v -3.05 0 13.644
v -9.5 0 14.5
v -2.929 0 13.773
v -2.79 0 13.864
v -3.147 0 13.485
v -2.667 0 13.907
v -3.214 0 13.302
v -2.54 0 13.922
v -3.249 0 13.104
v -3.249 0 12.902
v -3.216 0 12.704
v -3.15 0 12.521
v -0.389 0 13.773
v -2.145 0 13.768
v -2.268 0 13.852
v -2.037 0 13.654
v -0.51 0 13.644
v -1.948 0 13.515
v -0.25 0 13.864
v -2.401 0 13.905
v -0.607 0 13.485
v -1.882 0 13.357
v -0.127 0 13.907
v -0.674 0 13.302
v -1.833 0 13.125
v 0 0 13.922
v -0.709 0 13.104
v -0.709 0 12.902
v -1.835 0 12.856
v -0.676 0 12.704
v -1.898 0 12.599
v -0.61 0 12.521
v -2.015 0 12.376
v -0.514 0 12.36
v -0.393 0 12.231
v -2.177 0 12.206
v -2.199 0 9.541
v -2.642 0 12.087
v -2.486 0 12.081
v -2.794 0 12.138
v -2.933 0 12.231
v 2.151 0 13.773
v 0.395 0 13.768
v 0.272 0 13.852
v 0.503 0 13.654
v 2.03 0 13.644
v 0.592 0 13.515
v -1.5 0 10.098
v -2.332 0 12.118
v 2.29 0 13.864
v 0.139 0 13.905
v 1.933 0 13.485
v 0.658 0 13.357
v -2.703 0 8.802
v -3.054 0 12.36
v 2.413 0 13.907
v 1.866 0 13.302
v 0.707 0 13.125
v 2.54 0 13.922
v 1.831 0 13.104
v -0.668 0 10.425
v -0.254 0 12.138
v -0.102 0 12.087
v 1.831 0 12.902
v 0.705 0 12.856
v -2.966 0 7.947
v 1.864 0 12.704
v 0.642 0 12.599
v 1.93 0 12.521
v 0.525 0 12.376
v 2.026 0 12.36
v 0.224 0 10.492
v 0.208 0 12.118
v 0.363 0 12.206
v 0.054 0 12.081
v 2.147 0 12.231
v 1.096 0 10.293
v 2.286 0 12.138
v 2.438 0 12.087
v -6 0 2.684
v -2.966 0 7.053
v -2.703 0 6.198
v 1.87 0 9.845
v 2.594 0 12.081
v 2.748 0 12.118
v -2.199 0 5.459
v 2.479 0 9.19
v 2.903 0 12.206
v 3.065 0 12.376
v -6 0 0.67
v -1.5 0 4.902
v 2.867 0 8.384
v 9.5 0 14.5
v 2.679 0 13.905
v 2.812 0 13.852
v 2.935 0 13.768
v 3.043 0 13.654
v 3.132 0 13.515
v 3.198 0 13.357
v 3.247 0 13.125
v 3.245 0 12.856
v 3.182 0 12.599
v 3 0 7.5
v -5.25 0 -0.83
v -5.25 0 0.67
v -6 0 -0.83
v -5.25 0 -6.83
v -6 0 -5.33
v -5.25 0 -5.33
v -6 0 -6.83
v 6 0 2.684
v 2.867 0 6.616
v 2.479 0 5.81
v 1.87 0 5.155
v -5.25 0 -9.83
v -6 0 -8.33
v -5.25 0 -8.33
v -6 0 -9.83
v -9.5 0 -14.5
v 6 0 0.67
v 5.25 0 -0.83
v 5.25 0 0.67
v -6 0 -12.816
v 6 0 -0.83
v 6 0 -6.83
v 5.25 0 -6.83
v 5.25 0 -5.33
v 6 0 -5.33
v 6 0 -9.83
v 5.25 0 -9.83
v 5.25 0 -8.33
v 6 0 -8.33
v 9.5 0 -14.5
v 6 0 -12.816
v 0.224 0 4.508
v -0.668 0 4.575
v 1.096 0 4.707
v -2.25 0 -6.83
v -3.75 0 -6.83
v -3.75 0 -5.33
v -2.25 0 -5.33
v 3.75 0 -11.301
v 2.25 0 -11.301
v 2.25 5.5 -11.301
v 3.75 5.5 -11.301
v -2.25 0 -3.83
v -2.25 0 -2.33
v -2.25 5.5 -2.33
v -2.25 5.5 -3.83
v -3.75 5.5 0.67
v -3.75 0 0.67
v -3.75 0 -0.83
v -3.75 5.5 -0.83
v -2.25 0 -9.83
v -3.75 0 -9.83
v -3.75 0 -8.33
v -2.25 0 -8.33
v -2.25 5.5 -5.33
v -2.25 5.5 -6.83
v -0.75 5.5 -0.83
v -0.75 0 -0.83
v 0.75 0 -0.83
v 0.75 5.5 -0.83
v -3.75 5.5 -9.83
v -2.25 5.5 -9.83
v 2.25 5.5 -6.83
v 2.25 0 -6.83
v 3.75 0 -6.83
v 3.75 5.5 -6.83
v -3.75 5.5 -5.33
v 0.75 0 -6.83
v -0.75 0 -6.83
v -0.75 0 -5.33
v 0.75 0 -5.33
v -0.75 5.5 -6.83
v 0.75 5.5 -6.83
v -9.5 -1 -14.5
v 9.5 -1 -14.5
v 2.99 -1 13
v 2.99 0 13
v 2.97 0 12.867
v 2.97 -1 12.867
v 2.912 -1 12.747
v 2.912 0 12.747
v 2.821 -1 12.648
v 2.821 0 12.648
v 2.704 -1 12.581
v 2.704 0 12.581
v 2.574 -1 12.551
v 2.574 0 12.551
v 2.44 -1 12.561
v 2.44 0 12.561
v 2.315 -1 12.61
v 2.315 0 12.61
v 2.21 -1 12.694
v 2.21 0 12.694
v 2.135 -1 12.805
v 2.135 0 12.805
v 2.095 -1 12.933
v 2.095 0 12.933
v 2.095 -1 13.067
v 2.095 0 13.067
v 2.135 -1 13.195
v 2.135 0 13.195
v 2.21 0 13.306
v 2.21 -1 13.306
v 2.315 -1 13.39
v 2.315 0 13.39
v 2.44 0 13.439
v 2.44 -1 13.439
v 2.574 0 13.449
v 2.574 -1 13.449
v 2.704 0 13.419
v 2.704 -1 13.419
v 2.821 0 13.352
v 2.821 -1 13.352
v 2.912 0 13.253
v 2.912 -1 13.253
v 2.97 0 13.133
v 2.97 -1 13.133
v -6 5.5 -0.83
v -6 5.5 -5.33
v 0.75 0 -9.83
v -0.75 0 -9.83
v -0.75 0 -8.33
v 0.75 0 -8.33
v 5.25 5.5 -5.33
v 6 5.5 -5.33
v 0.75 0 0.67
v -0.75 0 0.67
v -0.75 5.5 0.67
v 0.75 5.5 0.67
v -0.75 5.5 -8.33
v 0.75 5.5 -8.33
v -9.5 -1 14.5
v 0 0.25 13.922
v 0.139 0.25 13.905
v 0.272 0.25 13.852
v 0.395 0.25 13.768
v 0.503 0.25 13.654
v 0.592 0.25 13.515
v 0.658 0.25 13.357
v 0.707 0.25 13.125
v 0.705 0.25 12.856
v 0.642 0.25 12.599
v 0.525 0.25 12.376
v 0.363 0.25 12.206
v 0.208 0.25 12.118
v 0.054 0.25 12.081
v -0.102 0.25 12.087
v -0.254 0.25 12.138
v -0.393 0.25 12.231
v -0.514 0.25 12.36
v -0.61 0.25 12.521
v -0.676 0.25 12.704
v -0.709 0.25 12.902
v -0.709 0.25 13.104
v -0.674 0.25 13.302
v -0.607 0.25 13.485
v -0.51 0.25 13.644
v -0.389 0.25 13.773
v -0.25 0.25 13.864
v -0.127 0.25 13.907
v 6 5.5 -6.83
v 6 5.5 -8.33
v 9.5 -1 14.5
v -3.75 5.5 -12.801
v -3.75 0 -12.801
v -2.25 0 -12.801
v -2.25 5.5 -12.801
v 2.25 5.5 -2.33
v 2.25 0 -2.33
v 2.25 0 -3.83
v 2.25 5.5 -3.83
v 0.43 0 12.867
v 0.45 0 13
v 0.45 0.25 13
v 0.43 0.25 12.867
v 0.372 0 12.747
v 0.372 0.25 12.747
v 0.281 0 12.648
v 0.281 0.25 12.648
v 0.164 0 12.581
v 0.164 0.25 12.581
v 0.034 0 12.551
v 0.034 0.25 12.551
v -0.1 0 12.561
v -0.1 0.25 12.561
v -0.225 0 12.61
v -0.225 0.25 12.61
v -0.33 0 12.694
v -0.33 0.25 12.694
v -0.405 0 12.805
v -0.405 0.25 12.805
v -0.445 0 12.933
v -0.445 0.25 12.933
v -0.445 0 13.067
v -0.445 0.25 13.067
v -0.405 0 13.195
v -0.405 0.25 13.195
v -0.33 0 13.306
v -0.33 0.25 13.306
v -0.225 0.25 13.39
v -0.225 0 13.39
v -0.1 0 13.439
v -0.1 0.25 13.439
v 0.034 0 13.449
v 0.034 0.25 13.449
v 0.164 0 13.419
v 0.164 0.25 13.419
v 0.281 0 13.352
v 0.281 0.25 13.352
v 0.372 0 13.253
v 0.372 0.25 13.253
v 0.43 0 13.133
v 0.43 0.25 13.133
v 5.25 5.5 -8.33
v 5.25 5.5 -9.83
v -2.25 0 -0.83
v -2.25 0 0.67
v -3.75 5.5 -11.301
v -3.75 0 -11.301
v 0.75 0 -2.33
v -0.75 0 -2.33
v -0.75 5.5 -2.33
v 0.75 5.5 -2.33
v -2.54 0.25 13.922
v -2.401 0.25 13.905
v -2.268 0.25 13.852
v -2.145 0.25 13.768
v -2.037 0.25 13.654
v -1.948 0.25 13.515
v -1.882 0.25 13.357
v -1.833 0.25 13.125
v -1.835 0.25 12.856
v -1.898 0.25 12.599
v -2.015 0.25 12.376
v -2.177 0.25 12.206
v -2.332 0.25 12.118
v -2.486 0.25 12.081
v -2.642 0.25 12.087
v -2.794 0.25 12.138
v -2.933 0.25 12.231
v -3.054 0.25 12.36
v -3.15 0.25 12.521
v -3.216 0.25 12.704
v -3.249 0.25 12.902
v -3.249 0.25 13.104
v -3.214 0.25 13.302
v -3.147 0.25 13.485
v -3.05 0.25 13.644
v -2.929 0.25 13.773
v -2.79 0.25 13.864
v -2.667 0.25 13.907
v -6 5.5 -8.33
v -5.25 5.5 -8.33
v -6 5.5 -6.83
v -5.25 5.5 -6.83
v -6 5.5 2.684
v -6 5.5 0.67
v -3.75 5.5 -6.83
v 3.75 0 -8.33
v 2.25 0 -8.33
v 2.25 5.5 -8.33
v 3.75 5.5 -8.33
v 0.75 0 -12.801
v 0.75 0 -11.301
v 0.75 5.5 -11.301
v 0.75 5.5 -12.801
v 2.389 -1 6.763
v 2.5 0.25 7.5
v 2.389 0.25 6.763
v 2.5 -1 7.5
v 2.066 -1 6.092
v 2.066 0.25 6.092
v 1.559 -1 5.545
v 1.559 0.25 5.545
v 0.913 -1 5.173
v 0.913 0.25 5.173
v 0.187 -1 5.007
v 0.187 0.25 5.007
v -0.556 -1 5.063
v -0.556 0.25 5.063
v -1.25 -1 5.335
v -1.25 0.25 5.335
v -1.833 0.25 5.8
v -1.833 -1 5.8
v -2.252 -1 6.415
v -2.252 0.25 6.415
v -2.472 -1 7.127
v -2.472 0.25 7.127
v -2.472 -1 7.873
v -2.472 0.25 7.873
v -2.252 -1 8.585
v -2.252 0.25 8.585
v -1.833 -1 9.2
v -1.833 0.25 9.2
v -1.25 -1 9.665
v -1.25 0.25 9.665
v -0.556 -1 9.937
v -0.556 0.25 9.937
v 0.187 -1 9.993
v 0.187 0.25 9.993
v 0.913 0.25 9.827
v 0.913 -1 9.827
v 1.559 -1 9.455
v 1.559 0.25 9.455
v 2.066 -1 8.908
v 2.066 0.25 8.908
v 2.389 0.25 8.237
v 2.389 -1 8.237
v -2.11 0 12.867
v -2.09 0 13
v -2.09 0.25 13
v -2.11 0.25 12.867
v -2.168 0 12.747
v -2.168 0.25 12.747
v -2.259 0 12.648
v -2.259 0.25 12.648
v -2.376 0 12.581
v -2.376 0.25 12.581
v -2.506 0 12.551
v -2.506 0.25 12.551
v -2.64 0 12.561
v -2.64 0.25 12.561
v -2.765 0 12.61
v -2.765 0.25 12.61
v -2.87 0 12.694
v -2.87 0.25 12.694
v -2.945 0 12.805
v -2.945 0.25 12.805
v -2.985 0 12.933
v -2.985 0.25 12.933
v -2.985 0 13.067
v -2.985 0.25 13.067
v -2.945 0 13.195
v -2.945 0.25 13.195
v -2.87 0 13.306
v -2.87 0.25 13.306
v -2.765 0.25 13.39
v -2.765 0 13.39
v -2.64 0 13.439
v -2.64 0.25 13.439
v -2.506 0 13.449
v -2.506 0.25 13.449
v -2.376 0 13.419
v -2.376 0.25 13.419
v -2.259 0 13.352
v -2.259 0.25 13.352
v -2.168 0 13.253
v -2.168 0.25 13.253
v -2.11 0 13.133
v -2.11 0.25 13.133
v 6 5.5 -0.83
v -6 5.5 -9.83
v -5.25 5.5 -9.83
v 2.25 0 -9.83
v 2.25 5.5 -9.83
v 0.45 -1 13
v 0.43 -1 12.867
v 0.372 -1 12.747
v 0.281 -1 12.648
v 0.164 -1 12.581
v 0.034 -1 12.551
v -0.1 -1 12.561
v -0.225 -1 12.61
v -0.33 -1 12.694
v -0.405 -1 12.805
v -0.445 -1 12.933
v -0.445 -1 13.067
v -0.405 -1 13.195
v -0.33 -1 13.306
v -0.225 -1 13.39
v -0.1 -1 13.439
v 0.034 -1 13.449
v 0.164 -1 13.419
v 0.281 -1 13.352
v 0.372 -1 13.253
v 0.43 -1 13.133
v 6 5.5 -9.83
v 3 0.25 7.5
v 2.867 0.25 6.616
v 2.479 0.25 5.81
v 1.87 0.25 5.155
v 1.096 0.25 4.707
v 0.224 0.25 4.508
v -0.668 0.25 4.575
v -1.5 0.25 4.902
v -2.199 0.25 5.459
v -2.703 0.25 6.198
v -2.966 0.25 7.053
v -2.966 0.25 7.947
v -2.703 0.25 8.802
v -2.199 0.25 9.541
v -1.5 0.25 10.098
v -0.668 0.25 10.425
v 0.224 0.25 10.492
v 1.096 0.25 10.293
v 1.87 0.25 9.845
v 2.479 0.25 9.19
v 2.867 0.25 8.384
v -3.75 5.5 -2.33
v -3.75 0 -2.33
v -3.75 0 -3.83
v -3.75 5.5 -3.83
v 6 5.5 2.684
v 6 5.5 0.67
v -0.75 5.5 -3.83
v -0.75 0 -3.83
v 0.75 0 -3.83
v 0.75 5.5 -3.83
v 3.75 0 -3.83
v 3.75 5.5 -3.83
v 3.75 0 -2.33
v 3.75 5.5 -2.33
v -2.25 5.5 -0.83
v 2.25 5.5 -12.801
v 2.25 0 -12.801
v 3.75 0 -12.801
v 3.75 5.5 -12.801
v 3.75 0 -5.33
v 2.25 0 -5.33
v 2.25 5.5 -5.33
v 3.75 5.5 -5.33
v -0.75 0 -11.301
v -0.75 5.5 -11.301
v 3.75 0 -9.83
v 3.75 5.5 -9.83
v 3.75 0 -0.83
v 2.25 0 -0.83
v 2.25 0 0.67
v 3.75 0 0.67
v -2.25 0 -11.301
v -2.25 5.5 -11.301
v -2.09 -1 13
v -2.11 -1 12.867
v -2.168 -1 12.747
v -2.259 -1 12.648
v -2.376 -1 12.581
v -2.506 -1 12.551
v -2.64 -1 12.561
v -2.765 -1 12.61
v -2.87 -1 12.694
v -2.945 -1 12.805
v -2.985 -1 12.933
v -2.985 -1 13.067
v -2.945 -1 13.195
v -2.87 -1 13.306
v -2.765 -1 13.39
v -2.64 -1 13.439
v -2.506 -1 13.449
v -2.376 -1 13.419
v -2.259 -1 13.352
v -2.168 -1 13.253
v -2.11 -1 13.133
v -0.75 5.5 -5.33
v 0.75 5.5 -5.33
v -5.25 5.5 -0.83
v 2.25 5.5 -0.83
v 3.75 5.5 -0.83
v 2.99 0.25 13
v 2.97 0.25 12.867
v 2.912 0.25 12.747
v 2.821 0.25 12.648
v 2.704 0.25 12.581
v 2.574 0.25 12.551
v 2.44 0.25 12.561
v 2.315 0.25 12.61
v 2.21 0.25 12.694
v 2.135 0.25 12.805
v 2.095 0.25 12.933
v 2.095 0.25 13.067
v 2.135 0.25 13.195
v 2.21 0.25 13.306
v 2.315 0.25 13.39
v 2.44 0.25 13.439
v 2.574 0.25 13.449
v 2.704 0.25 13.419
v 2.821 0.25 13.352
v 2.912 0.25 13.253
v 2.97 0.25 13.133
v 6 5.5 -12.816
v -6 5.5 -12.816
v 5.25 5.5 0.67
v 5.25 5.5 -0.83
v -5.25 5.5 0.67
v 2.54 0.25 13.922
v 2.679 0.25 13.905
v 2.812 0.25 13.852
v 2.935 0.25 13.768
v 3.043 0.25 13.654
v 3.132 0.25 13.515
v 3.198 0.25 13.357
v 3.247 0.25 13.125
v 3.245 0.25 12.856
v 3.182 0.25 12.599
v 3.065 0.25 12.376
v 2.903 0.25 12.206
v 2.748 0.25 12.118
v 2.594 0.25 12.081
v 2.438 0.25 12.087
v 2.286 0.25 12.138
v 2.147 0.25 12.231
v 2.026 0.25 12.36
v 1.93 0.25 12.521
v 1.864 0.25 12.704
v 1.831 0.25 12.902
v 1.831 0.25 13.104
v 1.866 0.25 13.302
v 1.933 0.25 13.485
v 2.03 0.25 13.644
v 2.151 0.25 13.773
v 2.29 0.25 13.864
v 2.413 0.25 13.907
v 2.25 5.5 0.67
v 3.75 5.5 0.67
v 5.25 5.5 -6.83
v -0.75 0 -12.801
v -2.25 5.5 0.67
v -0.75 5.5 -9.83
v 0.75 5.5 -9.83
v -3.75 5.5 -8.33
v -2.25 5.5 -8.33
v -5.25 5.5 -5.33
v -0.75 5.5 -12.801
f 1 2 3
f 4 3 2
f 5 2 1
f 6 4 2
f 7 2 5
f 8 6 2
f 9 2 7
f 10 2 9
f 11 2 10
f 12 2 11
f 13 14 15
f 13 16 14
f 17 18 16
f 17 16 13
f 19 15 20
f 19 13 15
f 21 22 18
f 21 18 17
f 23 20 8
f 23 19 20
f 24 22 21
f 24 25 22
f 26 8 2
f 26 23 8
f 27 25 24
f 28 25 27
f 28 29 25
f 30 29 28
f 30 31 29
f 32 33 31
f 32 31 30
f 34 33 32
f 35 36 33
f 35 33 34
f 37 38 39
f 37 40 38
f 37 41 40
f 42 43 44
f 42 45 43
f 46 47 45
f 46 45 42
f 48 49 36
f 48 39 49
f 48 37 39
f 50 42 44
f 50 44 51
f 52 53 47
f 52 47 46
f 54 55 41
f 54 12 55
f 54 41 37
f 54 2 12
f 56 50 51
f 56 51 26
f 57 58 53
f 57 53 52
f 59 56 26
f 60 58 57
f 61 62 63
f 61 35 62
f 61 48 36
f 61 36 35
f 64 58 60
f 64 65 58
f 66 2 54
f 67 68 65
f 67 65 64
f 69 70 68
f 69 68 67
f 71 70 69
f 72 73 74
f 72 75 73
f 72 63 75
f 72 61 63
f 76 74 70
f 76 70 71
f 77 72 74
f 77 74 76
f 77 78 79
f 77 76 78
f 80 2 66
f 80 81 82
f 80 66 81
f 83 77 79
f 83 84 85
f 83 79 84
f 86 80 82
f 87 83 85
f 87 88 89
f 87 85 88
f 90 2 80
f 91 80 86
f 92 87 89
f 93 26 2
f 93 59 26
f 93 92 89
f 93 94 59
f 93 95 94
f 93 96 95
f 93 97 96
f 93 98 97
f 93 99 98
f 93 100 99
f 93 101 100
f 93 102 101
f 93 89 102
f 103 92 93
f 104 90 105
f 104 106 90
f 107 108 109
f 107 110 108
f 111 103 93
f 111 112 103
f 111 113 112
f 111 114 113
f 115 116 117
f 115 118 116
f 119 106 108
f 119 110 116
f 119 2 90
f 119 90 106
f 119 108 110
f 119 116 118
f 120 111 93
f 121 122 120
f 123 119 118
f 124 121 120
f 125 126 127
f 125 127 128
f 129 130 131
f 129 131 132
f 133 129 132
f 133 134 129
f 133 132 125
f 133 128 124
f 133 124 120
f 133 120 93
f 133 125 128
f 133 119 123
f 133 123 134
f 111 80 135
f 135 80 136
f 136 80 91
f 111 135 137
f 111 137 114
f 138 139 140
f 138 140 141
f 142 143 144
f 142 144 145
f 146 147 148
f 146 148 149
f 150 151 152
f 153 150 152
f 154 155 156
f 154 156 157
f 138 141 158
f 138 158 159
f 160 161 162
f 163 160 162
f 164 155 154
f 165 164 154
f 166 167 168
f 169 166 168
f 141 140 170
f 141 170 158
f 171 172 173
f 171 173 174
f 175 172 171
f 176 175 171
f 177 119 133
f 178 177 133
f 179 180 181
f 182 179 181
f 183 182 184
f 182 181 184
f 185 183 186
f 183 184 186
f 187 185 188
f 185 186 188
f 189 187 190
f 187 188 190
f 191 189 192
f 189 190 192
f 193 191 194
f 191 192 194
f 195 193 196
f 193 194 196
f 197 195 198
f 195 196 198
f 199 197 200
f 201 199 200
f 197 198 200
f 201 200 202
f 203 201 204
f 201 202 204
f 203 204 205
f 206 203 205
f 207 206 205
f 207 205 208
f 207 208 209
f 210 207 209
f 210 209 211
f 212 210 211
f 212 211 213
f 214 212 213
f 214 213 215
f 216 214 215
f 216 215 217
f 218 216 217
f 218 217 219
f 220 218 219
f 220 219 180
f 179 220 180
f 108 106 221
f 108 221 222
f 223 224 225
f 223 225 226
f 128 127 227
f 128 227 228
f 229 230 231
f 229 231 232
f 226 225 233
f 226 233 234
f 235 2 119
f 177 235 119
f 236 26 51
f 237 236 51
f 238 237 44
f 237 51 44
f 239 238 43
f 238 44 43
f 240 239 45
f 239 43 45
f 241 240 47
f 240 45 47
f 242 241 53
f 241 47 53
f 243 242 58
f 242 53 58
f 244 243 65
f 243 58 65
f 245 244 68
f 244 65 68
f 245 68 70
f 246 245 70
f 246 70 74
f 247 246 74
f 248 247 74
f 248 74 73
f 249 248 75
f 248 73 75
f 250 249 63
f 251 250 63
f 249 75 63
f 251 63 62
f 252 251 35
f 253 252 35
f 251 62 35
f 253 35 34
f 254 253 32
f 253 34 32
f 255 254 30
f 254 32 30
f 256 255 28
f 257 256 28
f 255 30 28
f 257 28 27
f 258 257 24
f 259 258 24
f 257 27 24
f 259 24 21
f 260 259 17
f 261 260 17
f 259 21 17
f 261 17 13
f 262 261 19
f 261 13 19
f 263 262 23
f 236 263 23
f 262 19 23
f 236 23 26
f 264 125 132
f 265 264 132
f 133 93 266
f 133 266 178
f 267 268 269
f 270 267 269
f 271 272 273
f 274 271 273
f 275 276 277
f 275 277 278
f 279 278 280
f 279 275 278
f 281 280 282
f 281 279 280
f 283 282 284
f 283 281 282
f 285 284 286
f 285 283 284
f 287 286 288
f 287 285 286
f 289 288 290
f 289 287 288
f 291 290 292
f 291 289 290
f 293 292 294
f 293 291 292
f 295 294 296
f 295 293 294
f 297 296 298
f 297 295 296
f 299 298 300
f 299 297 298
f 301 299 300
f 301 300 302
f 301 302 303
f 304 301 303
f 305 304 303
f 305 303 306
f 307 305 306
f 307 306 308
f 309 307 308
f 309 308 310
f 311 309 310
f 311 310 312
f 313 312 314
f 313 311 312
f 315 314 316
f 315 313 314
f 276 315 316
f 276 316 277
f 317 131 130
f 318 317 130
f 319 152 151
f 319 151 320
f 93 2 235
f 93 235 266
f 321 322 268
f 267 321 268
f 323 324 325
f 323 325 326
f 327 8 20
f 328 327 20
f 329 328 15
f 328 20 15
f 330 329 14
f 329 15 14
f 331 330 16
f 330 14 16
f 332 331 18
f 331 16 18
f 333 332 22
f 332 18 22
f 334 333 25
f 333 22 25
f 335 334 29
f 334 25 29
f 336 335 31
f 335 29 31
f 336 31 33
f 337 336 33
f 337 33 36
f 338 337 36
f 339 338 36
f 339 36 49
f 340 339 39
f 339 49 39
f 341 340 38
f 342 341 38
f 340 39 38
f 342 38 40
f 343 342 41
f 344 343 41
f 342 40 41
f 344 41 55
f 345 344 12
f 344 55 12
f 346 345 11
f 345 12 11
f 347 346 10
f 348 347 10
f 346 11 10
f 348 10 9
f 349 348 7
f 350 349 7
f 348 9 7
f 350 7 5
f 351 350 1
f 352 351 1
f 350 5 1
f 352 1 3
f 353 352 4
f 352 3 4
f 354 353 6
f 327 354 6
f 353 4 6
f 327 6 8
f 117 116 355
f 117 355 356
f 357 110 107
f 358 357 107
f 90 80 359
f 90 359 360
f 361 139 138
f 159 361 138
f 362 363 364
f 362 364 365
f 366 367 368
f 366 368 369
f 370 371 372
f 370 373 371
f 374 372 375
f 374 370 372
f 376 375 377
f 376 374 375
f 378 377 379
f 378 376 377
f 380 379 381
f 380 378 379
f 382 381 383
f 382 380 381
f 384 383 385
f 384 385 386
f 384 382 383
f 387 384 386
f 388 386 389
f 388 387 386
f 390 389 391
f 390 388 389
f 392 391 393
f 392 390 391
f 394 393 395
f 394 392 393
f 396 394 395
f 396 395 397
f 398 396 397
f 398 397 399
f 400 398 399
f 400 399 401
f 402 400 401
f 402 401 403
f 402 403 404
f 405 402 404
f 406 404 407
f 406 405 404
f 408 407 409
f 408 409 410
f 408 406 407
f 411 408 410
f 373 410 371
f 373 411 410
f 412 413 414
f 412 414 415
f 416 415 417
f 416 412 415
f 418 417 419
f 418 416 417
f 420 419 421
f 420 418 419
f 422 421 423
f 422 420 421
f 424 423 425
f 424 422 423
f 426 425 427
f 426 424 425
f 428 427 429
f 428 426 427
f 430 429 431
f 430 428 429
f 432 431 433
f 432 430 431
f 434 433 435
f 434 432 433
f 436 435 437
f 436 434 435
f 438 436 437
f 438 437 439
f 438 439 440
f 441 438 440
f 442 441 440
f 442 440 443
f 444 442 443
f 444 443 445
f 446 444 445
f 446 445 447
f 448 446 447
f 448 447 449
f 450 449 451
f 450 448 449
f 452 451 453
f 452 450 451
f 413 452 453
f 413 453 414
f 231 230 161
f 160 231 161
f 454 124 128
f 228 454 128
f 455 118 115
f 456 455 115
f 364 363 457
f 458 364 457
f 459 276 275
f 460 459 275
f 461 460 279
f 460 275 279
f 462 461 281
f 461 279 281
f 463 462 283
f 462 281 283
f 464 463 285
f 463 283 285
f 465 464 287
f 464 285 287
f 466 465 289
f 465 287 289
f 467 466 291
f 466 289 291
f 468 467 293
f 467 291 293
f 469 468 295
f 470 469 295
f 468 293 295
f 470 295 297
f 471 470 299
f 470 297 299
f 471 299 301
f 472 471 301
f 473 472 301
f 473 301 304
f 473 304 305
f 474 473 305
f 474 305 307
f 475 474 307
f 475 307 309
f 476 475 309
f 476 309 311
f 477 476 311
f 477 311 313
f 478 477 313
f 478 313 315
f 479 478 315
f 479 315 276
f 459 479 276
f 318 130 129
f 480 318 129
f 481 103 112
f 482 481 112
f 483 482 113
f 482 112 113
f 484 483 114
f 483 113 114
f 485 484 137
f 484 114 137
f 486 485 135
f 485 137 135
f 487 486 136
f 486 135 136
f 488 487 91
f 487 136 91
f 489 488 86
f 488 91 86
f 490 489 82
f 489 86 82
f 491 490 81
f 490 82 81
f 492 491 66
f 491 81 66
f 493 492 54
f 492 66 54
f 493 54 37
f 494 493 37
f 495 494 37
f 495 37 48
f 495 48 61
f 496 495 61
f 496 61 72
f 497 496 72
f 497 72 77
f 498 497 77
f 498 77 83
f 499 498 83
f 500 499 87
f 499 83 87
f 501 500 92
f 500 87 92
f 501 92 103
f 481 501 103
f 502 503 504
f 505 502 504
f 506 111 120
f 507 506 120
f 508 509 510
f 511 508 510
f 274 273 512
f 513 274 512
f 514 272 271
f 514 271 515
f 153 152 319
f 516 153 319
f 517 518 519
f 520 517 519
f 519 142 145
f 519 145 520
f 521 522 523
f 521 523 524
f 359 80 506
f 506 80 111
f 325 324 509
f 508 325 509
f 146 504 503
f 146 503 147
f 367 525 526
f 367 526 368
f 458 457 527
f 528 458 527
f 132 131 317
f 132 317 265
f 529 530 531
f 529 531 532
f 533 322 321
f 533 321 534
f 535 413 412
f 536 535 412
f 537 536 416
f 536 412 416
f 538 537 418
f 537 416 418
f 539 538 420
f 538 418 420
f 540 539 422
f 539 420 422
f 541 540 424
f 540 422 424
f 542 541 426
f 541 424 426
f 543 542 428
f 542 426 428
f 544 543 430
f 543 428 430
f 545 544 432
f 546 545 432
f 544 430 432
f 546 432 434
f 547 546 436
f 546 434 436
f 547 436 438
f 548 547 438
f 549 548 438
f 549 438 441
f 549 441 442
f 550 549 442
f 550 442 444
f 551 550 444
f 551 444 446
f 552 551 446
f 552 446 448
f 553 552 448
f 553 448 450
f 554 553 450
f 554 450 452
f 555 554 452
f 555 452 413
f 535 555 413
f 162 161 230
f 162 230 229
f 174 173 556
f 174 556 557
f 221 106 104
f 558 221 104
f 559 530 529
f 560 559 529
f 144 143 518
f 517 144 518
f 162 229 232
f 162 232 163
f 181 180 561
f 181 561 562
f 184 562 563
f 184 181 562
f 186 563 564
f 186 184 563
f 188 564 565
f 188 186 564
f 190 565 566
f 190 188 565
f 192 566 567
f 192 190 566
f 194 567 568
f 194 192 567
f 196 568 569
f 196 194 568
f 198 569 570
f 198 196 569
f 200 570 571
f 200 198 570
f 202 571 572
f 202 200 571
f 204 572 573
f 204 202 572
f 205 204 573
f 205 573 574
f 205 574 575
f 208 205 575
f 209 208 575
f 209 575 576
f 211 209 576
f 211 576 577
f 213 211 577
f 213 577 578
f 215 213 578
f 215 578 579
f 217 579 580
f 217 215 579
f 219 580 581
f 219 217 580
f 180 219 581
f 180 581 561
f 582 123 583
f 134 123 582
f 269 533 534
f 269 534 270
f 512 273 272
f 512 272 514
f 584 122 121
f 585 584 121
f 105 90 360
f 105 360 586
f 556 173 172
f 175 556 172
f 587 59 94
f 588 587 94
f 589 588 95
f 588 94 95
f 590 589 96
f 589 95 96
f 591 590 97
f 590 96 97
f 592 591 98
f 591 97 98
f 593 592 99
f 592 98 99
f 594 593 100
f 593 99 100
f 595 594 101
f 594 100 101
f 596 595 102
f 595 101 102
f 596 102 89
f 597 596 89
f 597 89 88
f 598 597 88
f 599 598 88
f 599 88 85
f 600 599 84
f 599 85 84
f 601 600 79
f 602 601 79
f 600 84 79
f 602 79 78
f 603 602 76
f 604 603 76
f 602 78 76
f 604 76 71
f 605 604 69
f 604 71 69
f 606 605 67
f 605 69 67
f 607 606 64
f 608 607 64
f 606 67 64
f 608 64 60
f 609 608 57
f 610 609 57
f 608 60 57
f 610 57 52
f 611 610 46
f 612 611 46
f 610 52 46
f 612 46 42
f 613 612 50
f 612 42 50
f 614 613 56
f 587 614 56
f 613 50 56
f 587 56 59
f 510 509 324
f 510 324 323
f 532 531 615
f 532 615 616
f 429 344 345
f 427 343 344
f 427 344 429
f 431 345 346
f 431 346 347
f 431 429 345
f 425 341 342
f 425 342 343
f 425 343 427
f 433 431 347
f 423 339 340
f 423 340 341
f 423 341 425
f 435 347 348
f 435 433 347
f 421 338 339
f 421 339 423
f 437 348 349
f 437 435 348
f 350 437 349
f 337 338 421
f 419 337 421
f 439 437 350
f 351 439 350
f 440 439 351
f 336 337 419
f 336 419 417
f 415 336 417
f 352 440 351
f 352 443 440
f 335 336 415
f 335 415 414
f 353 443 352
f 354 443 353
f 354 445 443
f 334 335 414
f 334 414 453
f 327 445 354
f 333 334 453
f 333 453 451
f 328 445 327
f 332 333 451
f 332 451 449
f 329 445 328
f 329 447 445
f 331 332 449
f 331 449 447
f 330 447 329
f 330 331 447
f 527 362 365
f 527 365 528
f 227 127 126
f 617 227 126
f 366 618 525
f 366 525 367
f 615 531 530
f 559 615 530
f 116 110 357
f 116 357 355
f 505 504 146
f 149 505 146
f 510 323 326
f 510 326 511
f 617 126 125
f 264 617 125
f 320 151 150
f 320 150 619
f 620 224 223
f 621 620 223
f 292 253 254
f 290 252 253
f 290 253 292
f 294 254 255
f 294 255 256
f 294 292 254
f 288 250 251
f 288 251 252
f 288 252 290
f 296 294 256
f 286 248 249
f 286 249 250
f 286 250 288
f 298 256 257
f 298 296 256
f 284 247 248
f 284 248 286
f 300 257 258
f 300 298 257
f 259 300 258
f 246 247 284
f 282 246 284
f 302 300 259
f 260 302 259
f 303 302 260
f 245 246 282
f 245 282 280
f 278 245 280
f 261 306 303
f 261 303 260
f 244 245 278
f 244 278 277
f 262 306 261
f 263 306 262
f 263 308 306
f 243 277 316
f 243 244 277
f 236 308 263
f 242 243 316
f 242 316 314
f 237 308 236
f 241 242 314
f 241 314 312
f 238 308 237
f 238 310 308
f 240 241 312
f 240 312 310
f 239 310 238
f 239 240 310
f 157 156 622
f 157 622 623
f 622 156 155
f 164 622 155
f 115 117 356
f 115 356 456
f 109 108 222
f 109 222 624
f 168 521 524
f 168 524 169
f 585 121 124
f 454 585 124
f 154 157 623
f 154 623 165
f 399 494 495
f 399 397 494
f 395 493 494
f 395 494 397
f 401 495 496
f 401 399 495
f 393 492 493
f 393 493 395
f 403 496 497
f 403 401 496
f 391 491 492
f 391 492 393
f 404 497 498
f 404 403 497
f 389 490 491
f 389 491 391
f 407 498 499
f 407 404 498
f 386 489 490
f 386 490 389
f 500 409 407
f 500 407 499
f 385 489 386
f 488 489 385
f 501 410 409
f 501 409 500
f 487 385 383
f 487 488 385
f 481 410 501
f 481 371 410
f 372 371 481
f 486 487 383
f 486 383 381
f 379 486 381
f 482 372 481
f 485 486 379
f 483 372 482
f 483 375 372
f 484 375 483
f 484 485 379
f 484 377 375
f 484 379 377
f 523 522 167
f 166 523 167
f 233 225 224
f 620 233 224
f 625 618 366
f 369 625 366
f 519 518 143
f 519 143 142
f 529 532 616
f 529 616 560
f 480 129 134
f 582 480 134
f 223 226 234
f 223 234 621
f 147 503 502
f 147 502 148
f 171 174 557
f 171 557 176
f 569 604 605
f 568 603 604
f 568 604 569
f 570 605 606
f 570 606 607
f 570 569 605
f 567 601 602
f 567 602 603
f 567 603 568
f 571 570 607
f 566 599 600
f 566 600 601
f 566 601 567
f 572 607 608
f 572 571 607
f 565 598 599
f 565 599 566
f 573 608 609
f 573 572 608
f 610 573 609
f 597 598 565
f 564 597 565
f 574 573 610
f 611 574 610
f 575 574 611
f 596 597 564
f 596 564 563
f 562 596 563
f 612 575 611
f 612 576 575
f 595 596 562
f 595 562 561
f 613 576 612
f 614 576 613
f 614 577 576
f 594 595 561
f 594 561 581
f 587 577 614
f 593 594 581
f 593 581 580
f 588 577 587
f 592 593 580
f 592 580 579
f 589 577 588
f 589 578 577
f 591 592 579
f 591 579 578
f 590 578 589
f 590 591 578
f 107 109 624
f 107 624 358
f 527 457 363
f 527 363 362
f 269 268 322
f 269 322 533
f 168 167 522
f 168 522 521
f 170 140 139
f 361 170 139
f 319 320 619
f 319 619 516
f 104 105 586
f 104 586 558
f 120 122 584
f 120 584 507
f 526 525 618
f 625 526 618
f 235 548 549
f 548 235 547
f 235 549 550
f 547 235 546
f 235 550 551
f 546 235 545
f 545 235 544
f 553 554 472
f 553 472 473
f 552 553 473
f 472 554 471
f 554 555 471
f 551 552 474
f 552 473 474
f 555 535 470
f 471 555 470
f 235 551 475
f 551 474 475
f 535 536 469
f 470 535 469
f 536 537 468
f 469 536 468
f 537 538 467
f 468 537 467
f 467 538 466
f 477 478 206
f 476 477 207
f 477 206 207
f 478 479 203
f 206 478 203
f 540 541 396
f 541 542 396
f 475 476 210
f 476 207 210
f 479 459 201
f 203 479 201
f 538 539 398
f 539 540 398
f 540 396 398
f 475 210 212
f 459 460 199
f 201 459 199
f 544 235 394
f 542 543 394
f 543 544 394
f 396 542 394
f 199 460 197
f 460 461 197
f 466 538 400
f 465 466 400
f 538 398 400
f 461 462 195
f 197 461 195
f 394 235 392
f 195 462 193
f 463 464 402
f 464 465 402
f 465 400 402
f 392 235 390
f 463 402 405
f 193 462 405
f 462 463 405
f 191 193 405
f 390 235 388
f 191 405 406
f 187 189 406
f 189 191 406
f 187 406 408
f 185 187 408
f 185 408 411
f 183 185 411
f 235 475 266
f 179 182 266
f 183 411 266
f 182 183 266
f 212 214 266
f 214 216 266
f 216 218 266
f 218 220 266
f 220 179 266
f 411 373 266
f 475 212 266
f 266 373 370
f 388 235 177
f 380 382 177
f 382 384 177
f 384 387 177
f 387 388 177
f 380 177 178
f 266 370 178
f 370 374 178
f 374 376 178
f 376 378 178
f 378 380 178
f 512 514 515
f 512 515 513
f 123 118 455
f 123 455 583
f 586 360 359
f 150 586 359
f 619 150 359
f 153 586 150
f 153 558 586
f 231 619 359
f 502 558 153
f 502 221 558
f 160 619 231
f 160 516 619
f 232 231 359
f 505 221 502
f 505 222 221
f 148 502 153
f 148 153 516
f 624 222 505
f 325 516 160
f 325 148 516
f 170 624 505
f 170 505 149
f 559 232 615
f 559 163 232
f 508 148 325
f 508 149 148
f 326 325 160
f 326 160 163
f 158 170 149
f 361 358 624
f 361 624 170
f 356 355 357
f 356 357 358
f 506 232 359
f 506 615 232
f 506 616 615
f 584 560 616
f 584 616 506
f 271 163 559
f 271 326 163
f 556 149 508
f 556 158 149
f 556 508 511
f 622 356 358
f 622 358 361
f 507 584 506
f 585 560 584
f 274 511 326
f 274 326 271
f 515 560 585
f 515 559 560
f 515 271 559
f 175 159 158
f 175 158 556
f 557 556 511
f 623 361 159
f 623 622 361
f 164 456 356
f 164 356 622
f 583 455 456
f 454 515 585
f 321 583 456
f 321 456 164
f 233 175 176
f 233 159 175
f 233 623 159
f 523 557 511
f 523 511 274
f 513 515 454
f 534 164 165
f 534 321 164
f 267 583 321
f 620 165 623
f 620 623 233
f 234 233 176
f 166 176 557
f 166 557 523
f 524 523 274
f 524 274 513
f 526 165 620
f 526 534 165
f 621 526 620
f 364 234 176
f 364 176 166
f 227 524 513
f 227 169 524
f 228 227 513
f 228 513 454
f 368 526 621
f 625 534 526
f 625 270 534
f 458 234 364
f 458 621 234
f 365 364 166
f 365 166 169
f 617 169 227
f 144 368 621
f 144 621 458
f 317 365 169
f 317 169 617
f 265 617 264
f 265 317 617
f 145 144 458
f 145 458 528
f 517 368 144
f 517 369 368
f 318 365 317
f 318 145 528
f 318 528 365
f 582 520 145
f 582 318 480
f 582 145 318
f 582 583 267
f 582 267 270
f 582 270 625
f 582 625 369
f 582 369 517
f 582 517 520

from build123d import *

# Parameters (mm, degrees)
SKETCH1_W               = 19
SKETCH1_H               = 29
SKETCH1_R               = 2.5
BOSS_EXTRUDE2_DEPTH     = 1
SKETCH3_R               = 3
SKETCH3_R_2             = 2.5
SKETCH3_RX              = 0.922092895
SKETCH3_RY              = 0.713508325
SKETCH3_R_3             = 0.45
BOSS_EXTRUDE3_DEPTH     = 0.25
SKETCH4_R               = 0.45
CUT_EXTRUDE1_DEPTH      = 1.25
CUT_EXTRUDE1_DEPTH_BACK = 2
SKETCH5_W               = 12
SKETCH5_H               = 15.5
BOSS_EXTRUDE4_DEPTH     = 5.5
SKETCH7_W               = 1.5
SKETCH7_H               = 1.5
SKETCH7_W_2             = 0.75
CUT_EXTRUDE2_DEPTH      = 6


with BuildPart() as part:
    # Sketch1 → Boss-Extrude2 (new body)
    with BuildSketch(Plane(origin=(0, 0, 0), x_dir=(1, 0, 0), z_dir=(0, 1, 0))):
        Rectangle(SKETCH1_W, SKETCH1_H)
        with Locations((0, -7.5)):
            Circle(SKETCH1_R, mode=Mode.SUBTRACT)
    extrude(amount=-BOSS_EXTRUDE2_DEPTH)

    # Sketch3 → Boss-Extrude3 (add)
    with BuildSketch(Plane(origin=(0, 0, 0), x_dir=(1, 0, 0), z_dir=(0, 1, 0))):
        with Locations((0, -7.5)):
            Circle(SKETCH3_R)
        with Locations((0, -7.5)):
            Circle(SKETCH3_R_2, mode=Mode.SUBTRACT)
        with Locations(Location((0, -13), (0, 0, -90))):
            Ellipse(SKETCH3_RX, SKETCH3_RY)
        with Locations((0, -13)):
            Circle(SKETCH3_R_3, mode=Mode.SUBTRACT)
        with Locations(Location((2.54, -13), (0, 0, -90))):
            Ellipse(SKETCH3_RX, SKETCH3_RY)
        with Locations((2.54, -13)):
            Circle(SKETCH3_R_3, mode=Mode.SUBTRACT)
        with Locations(Location((-2.54, -13), (0, 0, -90))):
            Ellipse(SKETCH3_RX, SKETCH3_RY)
        with Locations((-2.54, -13)):
            Circle(SKETCH3_R_3, mode=Mode.SUBTRACT)
    extrude(amount=BOSS_EXTRUDE3_DEPTH)

    # Sketch4 → Cut-Extrude1 (cut, two sides)
    with BuildSketch(Plane(origin=(0, 0, 0), x_dir=(1, 0, 0), z_dir=(0, 1, 0))) as cut_extrude1_sk:
        with Locations((-2.54, -13)):
            Circle(SKETCH4_R)
        with Locations((0, -13)):
            Circle(SKETCH4_R)
        with Locations((2.54, -13)):
            Circle(SKETCH4_R)
    extrude(amount=CUT_EXTRUDE1_DEPTH, mode=Mode.SUBTRACT)
    extrude(cut_extrude1_sk.sketch, amount=-CUT_EXTRUDE1_DEPTH_BACK, mode=Mode.SUBTRACT)

    # Sketch5 → Boss-Extrude4 (add)
    with BuildSketch(Plane(origin=(0, 0, 0), x_dir=(1, 0, 0), z_dir=(0, 1, 0))):
        with Locations((0, 5.065615618)):
            Rectangle(SKETCH5_W, SKETCH5_H)
    extrude(amount=BOSS_EXTRUDE4_DEPTH)

    # Sketch7 → Cut-Extrude2 (cut)
    with BuildSketch(Plane(origin=(0, 0, 0), x_dir=(1, 0, 0), z_dir=(0, 1, 0))):
        with Locations((-3, 12.050904241)):
            Rectangle(SKETCH7_W, SKETCH7_H)
        with Locations((0, 12.050904241)):
            Rectangle(SKETCH7_W, SKETCH7_H)
        with Locations((3, 12.050904241)):
            Rectangle(SKETCH7_W, SKETCH7_H)
        with Locations((-3, 9.080326995)):
            Rectangle(SKETCH7_W, SKETCH7_H)
        with Locations((3, 9.080326995)):
            Rectangle(SKETCH7_W, SKETCH7_H)
        with Locations((0, 9.080326995)):
            Rectangle(SKETCH7_W, SKETCH7_H)
        with Locations((-3, 6.080326995)):
            Rectangle(SKETCH7_W, SKETCH7_H)
        with Locations((0, 6.080326995)):
            Rectangle(SKETCH7_W, SKETCH7_H)
        with Locations((3, 6.080326995)):
            Rectangle(SKETCH7_W, SKETCH7_H)
        with Locations((-3, 3.080326995)):
            Rectangle(SKETCH7_W, SKETCH7_H)
        with Locations((3, 3.080326995)):
            Rectangle(SKETCH7_W, SKETCH7_H)
        with Locations((0, 3.080326995)):
            Rectangle(SKETCH7_W, SKETCH7_H)
        with Locations((-3, 0.080326995)):
            Rectangle(SKETCH7_W, SKETCH7_H)
        with Locations((0, 0.080326995)):
            Rectangle(SKETCH7_W, SKETCH7_H)
        with Locations((3, 0.080326995)):
            Rectangle(SKETCH7_W, SKETCH7_H)
        with Locations((5.625, 6.080326995)):
            Rectangle(SKETCH7_W_2, SKETCH7_H)
        with Locations((-5.625, 6.080326995)):
            Rectangle(SKETCH7_W_2, SKETCH7_H)
        with Locations((5.625, 9.080326995)):
            Rectangle(SKETCH7_W_2, SKETCH7_H)
        with Locations((-5.625, 9.080326995)):
            Rectangle(SKETCH7_W_2, SKETCH7_H)
        with Locations((5.625, 0.080326995)):
            Rectangle(SKETCH7_W_2, SKETCH7_H)
        with Locations((-5.625, 0.080326995)):
            Rectangle(SKETCH7_W_2, SKETCH7_H)
    extrude(amount=CUT_EXTRUDE2_DEPTH, mode=Mode.SUBTRACT)


solid = part.part
